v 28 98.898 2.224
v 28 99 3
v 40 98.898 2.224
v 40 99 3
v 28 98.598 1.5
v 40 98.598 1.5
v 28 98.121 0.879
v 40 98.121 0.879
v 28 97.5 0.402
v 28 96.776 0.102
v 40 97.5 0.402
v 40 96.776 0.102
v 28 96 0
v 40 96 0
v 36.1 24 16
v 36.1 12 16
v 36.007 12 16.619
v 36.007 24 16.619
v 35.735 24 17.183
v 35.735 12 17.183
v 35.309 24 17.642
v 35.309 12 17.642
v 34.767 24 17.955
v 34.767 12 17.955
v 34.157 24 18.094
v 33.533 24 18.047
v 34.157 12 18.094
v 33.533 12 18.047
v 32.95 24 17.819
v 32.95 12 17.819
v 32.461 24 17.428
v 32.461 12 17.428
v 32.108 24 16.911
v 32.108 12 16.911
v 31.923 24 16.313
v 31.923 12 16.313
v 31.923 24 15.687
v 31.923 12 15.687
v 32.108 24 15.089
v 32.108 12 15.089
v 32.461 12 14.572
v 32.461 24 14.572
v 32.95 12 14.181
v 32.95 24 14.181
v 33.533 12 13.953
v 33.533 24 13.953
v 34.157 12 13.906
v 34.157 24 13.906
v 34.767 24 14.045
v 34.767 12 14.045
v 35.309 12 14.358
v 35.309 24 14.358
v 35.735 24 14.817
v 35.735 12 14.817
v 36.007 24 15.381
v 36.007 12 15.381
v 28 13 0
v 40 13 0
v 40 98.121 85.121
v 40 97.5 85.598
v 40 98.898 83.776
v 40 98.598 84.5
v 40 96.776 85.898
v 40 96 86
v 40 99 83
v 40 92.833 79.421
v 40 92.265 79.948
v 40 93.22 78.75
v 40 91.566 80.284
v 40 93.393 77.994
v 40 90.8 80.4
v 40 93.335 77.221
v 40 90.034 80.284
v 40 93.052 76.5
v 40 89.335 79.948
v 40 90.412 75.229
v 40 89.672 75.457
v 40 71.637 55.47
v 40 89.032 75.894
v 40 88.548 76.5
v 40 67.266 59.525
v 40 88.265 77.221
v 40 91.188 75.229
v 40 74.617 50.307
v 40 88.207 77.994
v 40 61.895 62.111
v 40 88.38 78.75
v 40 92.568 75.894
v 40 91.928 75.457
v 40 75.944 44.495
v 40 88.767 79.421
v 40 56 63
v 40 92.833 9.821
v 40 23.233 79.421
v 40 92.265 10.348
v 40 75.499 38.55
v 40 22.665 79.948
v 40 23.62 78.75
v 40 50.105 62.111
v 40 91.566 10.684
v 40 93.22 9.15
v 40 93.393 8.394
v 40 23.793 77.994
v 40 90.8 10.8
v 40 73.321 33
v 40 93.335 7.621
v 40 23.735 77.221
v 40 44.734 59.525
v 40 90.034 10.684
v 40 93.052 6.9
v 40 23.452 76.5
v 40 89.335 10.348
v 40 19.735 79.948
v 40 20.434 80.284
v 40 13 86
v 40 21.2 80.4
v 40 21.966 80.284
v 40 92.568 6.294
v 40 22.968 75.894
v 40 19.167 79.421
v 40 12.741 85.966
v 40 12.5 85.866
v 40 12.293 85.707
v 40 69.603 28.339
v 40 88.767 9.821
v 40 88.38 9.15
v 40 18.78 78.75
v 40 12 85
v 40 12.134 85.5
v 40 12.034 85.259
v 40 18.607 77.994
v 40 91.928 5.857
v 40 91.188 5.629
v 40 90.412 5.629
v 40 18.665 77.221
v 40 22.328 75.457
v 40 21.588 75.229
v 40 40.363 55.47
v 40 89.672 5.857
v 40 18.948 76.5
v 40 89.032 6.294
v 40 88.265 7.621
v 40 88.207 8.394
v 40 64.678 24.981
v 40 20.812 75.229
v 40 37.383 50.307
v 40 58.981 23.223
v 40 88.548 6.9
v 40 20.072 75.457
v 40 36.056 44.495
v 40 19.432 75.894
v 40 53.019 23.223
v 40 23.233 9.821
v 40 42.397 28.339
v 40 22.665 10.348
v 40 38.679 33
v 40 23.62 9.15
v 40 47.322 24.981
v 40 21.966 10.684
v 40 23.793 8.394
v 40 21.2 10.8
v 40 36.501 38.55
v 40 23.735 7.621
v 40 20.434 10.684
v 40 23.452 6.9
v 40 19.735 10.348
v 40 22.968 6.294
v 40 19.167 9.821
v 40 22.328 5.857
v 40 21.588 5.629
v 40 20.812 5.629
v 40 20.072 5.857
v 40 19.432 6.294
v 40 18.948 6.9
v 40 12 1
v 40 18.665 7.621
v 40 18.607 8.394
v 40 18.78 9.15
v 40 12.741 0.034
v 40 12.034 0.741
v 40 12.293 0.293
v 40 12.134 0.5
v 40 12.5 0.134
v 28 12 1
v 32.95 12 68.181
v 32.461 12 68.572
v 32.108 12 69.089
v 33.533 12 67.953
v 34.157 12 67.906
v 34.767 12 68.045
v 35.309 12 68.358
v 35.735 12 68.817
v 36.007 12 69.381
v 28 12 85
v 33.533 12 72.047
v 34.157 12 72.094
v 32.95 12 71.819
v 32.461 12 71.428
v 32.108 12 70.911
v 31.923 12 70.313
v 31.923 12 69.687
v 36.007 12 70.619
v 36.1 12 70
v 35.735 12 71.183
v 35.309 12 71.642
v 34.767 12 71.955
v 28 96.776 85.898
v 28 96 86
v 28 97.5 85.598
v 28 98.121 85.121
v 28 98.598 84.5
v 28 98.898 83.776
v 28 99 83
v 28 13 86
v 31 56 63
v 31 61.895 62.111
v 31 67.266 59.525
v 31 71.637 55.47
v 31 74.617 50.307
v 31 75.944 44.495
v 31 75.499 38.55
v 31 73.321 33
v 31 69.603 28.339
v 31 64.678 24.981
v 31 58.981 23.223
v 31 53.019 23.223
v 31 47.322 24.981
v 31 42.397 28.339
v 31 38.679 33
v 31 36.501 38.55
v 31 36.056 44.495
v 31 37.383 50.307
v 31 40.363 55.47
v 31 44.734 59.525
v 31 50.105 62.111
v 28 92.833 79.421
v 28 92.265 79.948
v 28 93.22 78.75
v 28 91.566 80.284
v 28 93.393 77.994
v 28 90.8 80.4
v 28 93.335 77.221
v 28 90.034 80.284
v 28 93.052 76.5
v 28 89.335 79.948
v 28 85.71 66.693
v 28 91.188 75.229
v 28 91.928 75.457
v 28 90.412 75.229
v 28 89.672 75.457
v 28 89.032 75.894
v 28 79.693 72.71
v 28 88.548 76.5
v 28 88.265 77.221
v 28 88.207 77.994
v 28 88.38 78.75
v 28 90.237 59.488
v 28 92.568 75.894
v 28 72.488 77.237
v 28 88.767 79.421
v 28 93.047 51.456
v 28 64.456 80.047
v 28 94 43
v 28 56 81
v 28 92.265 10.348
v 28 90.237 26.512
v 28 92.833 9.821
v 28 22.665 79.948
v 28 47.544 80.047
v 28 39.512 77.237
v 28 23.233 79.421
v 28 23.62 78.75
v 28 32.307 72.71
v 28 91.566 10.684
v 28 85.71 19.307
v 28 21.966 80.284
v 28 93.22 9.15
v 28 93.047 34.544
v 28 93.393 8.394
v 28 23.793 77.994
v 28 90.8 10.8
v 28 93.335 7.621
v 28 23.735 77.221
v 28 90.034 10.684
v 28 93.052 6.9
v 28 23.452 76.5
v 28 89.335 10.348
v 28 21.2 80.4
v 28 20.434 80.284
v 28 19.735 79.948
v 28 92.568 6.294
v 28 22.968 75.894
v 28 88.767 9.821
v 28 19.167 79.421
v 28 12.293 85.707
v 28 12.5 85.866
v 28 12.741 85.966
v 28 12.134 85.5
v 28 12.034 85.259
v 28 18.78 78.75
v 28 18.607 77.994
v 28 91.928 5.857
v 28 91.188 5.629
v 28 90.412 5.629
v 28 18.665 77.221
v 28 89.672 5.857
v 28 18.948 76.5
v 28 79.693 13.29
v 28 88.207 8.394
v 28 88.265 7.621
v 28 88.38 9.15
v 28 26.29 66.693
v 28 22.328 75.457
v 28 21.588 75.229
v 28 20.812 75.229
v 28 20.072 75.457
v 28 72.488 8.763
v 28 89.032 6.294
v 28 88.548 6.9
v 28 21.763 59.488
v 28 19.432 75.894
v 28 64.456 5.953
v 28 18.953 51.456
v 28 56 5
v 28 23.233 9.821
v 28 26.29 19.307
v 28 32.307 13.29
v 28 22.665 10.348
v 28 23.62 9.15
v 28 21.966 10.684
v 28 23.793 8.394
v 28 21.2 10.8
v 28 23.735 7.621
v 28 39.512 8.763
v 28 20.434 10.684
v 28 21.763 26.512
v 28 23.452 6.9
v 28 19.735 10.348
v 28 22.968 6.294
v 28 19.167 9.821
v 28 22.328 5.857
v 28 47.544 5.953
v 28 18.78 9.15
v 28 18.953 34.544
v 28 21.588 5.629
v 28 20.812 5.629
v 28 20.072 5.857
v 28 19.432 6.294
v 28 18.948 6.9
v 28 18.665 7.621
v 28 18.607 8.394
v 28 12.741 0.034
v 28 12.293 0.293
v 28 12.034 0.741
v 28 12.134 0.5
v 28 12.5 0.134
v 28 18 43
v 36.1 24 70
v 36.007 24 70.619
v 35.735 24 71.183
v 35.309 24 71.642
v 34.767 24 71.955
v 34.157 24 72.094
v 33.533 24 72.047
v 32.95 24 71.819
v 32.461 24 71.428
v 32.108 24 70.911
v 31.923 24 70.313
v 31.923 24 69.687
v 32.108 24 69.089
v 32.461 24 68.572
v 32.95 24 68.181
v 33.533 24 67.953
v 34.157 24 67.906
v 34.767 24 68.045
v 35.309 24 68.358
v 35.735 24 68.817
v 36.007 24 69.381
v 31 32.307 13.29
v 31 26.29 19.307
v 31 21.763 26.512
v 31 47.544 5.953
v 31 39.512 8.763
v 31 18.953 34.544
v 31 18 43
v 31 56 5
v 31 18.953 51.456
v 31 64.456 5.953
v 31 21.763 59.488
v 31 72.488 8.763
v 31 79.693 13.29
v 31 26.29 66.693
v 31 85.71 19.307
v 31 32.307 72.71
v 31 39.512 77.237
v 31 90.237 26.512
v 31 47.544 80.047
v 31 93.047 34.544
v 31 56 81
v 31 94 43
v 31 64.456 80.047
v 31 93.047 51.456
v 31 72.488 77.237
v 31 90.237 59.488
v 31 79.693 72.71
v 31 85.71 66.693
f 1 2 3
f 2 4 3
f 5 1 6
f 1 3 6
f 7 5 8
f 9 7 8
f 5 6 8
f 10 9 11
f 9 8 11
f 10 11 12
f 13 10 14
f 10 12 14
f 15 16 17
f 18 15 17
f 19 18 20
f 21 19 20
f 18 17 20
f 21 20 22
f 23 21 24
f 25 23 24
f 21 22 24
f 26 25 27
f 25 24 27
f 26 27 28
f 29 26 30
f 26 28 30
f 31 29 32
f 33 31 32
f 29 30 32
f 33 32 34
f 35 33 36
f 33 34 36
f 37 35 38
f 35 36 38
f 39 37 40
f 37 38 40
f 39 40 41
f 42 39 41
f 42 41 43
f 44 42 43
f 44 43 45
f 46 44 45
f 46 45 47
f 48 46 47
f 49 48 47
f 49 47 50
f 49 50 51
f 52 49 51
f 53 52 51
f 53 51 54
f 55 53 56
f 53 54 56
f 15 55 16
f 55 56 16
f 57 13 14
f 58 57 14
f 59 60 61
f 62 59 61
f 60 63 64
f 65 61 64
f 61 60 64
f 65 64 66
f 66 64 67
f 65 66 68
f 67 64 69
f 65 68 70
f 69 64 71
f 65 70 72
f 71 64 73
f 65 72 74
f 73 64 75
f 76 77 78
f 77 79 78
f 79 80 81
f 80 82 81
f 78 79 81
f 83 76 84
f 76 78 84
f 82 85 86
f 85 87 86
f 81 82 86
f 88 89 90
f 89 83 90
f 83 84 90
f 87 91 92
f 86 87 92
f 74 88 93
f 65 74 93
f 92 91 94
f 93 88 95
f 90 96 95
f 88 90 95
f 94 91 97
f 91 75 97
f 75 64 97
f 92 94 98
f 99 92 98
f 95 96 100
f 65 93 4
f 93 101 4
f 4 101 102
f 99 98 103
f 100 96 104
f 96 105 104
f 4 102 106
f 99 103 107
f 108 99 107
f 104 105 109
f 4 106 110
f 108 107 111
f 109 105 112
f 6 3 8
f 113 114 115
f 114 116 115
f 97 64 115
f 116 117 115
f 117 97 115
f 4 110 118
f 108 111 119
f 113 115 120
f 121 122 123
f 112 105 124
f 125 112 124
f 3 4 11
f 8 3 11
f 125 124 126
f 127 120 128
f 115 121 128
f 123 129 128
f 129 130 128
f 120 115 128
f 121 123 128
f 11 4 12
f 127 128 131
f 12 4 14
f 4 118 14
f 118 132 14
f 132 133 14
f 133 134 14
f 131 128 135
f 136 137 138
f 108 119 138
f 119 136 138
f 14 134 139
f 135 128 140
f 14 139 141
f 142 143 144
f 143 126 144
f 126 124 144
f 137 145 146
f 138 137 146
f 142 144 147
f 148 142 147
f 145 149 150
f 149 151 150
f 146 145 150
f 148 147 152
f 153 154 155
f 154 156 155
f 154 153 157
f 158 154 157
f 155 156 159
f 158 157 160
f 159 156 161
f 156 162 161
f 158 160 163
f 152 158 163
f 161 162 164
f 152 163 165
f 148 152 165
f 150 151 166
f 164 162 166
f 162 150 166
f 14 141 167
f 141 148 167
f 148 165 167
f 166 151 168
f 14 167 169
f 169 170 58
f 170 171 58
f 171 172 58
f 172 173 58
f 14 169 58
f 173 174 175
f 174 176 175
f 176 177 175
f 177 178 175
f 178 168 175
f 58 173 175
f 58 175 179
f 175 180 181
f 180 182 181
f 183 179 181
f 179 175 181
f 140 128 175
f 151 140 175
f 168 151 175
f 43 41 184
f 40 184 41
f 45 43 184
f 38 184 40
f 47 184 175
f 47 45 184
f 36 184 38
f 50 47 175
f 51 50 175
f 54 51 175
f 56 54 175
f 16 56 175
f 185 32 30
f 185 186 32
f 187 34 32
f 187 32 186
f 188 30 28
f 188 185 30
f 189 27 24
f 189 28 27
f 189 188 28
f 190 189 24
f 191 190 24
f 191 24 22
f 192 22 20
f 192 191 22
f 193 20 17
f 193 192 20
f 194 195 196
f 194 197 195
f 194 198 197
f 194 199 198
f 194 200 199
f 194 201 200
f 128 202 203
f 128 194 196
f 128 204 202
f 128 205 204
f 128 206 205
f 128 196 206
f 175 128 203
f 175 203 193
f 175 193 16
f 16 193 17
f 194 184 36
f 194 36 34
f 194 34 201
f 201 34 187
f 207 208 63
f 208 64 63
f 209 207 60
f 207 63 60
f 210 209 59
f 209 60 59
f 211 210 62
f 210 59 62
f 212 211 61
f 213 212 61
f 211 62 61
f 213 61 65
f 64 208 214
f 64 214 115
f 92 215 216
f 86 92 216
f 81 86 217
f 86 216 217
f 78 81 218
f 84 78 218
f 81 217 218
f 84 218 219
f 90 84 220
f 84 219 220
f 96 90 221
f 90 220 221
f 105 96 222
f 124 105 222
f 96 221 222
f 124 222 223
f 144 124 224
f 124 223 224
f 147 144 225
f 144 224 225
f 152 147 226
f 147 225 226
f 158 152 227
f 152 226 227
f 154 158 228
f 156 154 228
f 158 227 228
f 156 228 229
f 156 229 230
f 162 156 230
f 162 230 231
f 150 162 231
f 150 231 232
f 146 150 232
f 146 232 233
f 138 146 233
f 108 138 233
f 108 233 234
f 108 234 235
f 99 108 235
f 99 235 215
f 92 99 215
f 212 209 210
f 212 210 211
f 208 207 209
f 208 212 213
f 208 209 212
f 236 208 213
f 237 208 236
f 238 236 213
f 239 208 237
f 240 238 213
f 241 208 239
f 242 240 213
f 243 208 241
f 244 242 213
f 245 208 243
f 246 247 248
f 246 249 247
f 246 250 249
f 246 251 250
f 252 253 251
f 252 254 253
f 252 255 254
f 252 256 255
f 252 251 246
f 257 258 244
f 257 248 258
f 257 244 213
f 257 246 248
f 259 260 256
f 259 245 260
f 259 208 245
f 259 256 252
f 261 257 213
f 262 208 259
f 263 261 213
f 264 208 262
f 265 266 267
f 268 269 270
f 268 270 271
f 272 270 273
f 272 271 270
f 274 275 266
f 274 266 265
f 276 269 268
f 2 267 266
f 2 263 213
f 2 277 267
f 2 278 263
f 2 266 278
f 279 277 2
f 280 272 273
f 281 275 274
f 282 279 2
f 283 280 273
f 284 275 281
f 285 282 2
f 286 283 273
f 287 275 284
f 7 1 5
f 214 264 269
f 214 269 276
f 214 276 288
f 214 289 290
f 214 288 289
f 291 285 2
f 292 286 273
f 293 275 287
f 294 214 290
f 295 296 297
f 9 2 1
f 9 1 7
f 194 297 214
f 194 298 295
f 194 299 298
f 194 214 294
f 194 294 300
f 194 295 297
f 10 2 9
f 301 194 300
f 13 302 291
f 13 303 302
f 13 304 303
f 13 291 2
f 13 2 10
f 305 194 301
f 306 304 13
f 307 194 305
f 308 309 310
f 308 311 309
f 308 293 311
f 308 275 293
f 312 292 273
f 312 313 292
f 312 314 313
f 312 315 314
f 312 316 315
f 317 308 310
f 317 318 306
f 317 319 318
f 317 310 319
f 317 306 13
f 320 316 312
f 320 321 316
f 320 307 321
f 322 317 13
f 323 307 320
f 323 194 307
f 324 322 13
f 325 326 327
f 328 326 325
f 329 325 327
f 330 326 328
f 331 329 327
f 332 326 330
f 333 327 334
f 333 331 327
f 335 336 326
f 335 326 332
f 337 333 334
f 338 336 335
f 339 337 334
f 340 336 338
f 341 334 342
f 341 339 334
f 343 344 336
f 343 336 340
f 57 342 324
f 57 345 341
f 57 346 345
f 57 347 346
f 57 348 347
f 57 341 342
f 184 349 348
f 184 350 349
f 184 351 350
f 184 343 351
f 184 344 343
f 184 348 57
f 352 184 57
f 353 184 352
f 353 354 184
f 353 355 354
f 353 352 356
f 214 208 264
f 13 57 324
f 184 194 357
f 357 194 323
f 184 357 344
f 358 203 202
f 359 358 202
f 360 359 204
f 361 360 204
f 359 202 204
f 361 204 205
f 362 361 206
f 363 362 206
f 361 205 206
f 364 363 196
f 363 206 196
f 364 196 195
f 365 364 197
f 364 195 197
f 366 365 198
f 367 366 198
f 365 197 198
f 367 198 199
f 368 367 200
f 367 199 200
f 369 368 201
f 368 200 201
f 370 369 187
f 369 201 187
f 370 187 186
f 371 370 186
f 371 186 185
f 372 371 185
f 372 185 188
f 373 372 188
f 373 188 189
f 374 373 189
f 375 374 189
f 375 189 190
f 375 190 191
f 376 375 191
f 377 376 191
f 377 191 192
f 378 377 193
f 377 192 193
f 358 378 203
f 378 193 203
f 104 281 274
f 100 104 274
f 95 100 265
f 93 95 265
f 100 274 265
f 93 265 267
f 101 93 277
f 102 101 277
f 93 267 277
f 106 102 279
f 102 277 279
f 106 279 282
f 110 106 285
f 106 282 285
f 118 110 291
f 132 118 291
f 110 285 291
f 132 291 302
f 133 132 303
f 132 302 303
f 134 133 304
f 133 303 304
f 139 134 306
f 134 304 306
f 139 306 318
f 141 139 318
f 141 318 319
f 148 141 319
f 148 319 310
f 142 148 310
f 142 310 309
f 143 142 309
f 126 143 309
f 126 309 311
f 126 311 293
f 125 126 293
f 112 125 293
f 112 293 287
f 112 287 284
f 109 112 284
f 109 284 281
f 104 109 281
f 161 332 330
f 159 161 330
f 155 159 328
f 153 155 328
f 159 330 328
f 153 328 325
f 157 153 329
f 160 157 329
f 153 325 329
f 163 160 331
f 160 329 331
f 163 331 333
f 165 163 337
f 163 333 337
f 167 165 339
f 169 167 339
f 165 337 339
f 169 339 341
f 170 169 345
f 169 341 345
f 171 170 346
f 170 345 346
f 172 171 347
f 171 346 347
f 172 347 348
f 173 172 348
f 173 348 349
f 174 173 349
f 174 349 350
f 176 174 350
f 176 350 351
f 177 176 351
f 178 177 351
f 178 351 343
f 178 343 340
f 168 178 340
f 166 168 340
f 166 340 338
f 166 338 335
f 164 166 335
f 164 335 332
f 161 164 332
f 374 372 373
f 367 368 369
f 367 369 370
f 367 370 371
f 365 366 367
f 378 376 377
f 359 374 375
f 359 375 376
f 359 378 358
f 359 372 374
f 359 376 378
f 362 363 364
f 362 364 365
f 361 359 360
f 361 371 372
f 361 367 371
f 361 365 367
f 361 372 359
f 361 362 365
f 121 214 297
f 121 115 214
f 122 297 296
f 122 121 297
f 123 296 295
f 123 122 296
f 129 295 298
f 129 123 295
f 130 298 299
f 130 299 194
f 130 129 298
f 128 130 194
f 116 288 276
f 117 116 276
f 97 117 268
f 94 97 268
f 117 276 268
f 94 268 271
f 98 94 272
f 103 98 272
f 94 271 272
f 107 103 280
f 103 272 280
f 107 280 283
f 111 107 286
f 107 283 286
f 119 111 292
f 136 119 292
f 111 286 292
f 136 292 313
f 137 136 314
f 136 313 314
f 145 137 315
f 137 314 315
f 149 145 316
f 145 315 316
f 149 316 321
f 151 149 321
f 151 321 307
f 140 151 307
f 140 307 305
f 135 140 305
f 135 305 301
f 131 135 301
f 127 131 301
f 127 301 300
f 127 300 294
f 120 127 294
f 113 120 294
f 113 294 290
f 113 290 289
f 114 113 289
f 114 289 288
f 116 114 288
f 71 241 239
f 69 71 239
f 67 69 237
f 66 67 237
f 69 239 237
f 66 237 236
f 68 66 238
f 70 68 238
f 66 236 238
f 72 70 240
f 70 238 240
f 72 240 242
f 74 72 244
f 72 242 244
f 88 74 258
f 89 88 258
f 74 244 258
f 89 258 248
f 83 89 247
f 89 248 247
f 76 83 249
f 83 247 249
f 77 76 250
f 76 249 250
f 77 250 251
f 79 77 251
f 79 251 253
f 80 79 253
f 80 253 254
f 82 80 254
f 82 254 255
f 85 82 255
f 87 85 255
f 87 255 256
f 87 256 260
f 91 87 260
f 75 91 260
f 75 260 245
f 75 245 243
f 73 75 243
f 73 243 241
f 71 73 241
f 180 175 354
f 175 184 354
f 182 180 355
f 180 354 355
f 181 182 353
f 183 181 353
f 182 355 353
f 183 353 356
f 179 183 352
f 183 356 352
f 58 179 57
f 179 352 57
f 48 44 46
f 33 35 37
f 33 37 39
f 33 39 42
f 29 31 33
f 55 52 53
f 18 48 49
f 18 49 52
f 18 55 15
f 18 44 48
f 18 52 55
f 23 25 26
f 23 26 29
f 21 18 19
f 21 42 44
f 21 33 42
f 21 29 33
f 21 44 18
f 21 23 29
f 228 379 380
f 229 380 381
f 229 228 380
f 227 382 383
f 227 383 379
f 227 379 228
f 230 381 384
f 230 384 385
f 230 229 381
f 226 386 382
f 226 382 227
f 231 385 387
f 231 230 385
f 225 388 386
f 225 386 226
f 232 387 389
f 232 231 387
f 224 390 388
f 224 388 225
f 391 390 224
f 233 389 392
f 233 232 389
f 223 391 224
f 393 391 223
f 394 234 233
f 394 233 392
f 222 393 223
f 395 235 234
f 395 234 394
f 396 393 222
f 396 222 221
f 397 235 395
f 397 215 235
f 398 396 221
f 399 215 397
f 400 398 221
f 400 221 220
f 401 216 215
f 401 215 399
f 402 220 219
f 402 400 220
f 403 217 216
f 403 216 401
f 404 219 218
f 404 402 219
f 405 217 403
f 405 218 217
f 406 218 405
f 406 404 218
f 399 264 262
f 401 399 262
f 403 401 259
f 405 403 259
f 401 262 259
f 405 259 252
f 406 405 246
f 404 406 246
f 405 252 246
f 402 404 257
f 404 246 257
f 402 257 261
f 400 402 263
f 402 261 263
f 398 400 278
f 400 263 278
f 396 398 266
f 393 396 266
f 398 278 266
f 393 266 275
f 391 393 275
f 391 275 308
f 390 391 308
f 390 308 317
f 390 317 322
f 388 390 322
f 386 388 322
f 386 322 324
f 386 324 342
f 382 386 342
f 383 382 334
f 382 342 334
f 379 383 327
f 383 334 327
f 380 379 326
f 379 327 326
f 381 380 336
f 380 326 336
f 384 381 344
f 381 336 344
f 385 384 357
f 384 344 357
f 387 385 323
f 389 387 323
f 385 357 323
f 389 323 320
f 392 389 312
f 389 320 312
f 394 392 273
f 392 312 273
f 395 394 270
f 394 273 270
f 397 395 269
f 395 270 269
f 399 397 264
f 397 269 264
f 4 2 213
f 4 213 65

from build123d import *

# Parameters (mm, degrees)
SKETCH1_W           = 40
SKETCH1_H           = 86
BOSS_EXTRUDE1_DEPTH = 12
SKETCH2_W           = 12
SKETCH2_H           = 86
BOSS_EXTRUDE2_DEPTH = 87
SKETCH3_R           = 3
CUT_EXTRUDE1_DEPTH  = 13
SKETCH4_R           = 38
CUT_EXTRUDE2_DEPTH  = 3
SKETCH5_R           = 2.6
CUT_EXTRUDE3_DEPTH  = 13
FILLET1_R           = 3
SKETCH6_R           = 20
CUT_EXTRUDE4_DEPTH  = 13
SKETCH7_W           = 40
SKETCH7_H           = 12
CUT_EXTRUDE5_DEPTH  = 87
FILLET2_R           = 1
SKETCH8_R           = 2.1
CUT_EXTRUDE6_DEPTH  = 12


with BuildPart() as part:
    # Sketch1 → Boss-Extrude1 (new body)
    with BuildSketch(Plane(origin=(0, 0, 0), x_dir=(1, 0, 0), z_dir=(0, 1, 0))):
        with Locations((20, -43)):
            Rectangle(SKETCH1_W, SKETCH1_H)
    extrude(amount=BOSS_EXTRUDE1_DEPTH)

    # Sketch2 → Boss-Extrude2 (add)
    with BuildSketch(Plane(origin=(0, 12, 0), x_dir=(1, 0, 0), z_dir=(0, 1, 0))):
        with Locations((34, -43)):
            Rectangle(SKETCH2_W, SKETCH2_H)
    extrude(amount=BOSS_EXTRUDE2_DEPTH)

    # Sketch3 → Cut-Extrude1 (cut, through all)
    with BuildSketch(Plane(origin=(0, 12, 0), x_dir=(1, 0, 0), z_dir=(0, 1, 0))):
        with Locations((14, -8.4)):
            Circle(SKETCH3_R)
        with Locations((14, -77.6)):
            Circle(SKETCH3_R)
    extrude(amount=-CUT_EXTRUDE1_DEPTH, mode=Mode.SUBTRACT)

    # Sketch4 → Cut-Extrude2 (cut)
    with BuildSketch(Plane.ZY.offset(-28)):
        with Locations((43, 56)):
            Circle(SKETCH4_R)
    extrude(amount=-CUT_EXTRUDE2_DEPTH, mode=Mode.SUBTRACT)

    # Sketch5 → Cut-Extrude3 (cut, through all)
    with BuildSketch(Plane.ZY.offset(-28)):
        with Locations((77.8, 90.8)):
            Circle(SKETCH5_R)
        with Locations((77.8, 21.2)):
            Circle(SKETCH5_R)
        with Locations((8.2, 90.8)):
            Circle(SKETCH5_R)
        with Locations((8.2, 21.2)):
            Circle(SKETCH5_R)
    extrude(amount=-CUT_EXTRUDE3_DEPTH, mode=Mode.SUBTRACT)

    # Fillet1
    fillet1_edges = [part.edges().sort_by_distance(p)[0] for p in [
        (34, 99, 0),
        (34, 99, 86),
    ]]
    fillet(fillet1_edges, radius=FILLET1_R)

    # Sketch6 → Cut-Extrude4 (cut, through all)
    with BuildSketch(Plane.ZY.offset(-28)):
        with Locations((43, 56)):
            Circle(SKETCH6_R)
    extrude(amount=-CUT_EXTRUDE4_DEPTH, mode=Mode.SUBTRACT)

    # Sketch7 → Cut-Extrude5 (cut, through all)
    with BuildSketch(Plane.XY.offset(86)):
        with Locations((20, 6)):
            Rectangle(SKETCH7_W, SKETCH7_H)
    extrude(amount=-CUT_EXTRUDE5_DEPTH, mode=Mode.SUBTRACT)

    # Fillet2
    fillet2_edges = [part.edges().sort_by_distance(p)[0] for p in [
        (34, 12, 0),
        (34, 12, 86),
    ]]
    fillet(fillet2_edges, radius=FILLET2_R)

    # Sketch8 → Cut-Extrude6 (cut)
    with BuildSketch(Plane.XZ.offset(-12)):
        with Locations((34, 70)):
            Circle(SKETCH8_R)
        with Locations((34, 16)):
            Circle(SKETCH8_R)
    extrude(amount=-CUT_EXTRUDE6_DEPTH, mode=Mode.SUBTRACT)


solid = part.part
